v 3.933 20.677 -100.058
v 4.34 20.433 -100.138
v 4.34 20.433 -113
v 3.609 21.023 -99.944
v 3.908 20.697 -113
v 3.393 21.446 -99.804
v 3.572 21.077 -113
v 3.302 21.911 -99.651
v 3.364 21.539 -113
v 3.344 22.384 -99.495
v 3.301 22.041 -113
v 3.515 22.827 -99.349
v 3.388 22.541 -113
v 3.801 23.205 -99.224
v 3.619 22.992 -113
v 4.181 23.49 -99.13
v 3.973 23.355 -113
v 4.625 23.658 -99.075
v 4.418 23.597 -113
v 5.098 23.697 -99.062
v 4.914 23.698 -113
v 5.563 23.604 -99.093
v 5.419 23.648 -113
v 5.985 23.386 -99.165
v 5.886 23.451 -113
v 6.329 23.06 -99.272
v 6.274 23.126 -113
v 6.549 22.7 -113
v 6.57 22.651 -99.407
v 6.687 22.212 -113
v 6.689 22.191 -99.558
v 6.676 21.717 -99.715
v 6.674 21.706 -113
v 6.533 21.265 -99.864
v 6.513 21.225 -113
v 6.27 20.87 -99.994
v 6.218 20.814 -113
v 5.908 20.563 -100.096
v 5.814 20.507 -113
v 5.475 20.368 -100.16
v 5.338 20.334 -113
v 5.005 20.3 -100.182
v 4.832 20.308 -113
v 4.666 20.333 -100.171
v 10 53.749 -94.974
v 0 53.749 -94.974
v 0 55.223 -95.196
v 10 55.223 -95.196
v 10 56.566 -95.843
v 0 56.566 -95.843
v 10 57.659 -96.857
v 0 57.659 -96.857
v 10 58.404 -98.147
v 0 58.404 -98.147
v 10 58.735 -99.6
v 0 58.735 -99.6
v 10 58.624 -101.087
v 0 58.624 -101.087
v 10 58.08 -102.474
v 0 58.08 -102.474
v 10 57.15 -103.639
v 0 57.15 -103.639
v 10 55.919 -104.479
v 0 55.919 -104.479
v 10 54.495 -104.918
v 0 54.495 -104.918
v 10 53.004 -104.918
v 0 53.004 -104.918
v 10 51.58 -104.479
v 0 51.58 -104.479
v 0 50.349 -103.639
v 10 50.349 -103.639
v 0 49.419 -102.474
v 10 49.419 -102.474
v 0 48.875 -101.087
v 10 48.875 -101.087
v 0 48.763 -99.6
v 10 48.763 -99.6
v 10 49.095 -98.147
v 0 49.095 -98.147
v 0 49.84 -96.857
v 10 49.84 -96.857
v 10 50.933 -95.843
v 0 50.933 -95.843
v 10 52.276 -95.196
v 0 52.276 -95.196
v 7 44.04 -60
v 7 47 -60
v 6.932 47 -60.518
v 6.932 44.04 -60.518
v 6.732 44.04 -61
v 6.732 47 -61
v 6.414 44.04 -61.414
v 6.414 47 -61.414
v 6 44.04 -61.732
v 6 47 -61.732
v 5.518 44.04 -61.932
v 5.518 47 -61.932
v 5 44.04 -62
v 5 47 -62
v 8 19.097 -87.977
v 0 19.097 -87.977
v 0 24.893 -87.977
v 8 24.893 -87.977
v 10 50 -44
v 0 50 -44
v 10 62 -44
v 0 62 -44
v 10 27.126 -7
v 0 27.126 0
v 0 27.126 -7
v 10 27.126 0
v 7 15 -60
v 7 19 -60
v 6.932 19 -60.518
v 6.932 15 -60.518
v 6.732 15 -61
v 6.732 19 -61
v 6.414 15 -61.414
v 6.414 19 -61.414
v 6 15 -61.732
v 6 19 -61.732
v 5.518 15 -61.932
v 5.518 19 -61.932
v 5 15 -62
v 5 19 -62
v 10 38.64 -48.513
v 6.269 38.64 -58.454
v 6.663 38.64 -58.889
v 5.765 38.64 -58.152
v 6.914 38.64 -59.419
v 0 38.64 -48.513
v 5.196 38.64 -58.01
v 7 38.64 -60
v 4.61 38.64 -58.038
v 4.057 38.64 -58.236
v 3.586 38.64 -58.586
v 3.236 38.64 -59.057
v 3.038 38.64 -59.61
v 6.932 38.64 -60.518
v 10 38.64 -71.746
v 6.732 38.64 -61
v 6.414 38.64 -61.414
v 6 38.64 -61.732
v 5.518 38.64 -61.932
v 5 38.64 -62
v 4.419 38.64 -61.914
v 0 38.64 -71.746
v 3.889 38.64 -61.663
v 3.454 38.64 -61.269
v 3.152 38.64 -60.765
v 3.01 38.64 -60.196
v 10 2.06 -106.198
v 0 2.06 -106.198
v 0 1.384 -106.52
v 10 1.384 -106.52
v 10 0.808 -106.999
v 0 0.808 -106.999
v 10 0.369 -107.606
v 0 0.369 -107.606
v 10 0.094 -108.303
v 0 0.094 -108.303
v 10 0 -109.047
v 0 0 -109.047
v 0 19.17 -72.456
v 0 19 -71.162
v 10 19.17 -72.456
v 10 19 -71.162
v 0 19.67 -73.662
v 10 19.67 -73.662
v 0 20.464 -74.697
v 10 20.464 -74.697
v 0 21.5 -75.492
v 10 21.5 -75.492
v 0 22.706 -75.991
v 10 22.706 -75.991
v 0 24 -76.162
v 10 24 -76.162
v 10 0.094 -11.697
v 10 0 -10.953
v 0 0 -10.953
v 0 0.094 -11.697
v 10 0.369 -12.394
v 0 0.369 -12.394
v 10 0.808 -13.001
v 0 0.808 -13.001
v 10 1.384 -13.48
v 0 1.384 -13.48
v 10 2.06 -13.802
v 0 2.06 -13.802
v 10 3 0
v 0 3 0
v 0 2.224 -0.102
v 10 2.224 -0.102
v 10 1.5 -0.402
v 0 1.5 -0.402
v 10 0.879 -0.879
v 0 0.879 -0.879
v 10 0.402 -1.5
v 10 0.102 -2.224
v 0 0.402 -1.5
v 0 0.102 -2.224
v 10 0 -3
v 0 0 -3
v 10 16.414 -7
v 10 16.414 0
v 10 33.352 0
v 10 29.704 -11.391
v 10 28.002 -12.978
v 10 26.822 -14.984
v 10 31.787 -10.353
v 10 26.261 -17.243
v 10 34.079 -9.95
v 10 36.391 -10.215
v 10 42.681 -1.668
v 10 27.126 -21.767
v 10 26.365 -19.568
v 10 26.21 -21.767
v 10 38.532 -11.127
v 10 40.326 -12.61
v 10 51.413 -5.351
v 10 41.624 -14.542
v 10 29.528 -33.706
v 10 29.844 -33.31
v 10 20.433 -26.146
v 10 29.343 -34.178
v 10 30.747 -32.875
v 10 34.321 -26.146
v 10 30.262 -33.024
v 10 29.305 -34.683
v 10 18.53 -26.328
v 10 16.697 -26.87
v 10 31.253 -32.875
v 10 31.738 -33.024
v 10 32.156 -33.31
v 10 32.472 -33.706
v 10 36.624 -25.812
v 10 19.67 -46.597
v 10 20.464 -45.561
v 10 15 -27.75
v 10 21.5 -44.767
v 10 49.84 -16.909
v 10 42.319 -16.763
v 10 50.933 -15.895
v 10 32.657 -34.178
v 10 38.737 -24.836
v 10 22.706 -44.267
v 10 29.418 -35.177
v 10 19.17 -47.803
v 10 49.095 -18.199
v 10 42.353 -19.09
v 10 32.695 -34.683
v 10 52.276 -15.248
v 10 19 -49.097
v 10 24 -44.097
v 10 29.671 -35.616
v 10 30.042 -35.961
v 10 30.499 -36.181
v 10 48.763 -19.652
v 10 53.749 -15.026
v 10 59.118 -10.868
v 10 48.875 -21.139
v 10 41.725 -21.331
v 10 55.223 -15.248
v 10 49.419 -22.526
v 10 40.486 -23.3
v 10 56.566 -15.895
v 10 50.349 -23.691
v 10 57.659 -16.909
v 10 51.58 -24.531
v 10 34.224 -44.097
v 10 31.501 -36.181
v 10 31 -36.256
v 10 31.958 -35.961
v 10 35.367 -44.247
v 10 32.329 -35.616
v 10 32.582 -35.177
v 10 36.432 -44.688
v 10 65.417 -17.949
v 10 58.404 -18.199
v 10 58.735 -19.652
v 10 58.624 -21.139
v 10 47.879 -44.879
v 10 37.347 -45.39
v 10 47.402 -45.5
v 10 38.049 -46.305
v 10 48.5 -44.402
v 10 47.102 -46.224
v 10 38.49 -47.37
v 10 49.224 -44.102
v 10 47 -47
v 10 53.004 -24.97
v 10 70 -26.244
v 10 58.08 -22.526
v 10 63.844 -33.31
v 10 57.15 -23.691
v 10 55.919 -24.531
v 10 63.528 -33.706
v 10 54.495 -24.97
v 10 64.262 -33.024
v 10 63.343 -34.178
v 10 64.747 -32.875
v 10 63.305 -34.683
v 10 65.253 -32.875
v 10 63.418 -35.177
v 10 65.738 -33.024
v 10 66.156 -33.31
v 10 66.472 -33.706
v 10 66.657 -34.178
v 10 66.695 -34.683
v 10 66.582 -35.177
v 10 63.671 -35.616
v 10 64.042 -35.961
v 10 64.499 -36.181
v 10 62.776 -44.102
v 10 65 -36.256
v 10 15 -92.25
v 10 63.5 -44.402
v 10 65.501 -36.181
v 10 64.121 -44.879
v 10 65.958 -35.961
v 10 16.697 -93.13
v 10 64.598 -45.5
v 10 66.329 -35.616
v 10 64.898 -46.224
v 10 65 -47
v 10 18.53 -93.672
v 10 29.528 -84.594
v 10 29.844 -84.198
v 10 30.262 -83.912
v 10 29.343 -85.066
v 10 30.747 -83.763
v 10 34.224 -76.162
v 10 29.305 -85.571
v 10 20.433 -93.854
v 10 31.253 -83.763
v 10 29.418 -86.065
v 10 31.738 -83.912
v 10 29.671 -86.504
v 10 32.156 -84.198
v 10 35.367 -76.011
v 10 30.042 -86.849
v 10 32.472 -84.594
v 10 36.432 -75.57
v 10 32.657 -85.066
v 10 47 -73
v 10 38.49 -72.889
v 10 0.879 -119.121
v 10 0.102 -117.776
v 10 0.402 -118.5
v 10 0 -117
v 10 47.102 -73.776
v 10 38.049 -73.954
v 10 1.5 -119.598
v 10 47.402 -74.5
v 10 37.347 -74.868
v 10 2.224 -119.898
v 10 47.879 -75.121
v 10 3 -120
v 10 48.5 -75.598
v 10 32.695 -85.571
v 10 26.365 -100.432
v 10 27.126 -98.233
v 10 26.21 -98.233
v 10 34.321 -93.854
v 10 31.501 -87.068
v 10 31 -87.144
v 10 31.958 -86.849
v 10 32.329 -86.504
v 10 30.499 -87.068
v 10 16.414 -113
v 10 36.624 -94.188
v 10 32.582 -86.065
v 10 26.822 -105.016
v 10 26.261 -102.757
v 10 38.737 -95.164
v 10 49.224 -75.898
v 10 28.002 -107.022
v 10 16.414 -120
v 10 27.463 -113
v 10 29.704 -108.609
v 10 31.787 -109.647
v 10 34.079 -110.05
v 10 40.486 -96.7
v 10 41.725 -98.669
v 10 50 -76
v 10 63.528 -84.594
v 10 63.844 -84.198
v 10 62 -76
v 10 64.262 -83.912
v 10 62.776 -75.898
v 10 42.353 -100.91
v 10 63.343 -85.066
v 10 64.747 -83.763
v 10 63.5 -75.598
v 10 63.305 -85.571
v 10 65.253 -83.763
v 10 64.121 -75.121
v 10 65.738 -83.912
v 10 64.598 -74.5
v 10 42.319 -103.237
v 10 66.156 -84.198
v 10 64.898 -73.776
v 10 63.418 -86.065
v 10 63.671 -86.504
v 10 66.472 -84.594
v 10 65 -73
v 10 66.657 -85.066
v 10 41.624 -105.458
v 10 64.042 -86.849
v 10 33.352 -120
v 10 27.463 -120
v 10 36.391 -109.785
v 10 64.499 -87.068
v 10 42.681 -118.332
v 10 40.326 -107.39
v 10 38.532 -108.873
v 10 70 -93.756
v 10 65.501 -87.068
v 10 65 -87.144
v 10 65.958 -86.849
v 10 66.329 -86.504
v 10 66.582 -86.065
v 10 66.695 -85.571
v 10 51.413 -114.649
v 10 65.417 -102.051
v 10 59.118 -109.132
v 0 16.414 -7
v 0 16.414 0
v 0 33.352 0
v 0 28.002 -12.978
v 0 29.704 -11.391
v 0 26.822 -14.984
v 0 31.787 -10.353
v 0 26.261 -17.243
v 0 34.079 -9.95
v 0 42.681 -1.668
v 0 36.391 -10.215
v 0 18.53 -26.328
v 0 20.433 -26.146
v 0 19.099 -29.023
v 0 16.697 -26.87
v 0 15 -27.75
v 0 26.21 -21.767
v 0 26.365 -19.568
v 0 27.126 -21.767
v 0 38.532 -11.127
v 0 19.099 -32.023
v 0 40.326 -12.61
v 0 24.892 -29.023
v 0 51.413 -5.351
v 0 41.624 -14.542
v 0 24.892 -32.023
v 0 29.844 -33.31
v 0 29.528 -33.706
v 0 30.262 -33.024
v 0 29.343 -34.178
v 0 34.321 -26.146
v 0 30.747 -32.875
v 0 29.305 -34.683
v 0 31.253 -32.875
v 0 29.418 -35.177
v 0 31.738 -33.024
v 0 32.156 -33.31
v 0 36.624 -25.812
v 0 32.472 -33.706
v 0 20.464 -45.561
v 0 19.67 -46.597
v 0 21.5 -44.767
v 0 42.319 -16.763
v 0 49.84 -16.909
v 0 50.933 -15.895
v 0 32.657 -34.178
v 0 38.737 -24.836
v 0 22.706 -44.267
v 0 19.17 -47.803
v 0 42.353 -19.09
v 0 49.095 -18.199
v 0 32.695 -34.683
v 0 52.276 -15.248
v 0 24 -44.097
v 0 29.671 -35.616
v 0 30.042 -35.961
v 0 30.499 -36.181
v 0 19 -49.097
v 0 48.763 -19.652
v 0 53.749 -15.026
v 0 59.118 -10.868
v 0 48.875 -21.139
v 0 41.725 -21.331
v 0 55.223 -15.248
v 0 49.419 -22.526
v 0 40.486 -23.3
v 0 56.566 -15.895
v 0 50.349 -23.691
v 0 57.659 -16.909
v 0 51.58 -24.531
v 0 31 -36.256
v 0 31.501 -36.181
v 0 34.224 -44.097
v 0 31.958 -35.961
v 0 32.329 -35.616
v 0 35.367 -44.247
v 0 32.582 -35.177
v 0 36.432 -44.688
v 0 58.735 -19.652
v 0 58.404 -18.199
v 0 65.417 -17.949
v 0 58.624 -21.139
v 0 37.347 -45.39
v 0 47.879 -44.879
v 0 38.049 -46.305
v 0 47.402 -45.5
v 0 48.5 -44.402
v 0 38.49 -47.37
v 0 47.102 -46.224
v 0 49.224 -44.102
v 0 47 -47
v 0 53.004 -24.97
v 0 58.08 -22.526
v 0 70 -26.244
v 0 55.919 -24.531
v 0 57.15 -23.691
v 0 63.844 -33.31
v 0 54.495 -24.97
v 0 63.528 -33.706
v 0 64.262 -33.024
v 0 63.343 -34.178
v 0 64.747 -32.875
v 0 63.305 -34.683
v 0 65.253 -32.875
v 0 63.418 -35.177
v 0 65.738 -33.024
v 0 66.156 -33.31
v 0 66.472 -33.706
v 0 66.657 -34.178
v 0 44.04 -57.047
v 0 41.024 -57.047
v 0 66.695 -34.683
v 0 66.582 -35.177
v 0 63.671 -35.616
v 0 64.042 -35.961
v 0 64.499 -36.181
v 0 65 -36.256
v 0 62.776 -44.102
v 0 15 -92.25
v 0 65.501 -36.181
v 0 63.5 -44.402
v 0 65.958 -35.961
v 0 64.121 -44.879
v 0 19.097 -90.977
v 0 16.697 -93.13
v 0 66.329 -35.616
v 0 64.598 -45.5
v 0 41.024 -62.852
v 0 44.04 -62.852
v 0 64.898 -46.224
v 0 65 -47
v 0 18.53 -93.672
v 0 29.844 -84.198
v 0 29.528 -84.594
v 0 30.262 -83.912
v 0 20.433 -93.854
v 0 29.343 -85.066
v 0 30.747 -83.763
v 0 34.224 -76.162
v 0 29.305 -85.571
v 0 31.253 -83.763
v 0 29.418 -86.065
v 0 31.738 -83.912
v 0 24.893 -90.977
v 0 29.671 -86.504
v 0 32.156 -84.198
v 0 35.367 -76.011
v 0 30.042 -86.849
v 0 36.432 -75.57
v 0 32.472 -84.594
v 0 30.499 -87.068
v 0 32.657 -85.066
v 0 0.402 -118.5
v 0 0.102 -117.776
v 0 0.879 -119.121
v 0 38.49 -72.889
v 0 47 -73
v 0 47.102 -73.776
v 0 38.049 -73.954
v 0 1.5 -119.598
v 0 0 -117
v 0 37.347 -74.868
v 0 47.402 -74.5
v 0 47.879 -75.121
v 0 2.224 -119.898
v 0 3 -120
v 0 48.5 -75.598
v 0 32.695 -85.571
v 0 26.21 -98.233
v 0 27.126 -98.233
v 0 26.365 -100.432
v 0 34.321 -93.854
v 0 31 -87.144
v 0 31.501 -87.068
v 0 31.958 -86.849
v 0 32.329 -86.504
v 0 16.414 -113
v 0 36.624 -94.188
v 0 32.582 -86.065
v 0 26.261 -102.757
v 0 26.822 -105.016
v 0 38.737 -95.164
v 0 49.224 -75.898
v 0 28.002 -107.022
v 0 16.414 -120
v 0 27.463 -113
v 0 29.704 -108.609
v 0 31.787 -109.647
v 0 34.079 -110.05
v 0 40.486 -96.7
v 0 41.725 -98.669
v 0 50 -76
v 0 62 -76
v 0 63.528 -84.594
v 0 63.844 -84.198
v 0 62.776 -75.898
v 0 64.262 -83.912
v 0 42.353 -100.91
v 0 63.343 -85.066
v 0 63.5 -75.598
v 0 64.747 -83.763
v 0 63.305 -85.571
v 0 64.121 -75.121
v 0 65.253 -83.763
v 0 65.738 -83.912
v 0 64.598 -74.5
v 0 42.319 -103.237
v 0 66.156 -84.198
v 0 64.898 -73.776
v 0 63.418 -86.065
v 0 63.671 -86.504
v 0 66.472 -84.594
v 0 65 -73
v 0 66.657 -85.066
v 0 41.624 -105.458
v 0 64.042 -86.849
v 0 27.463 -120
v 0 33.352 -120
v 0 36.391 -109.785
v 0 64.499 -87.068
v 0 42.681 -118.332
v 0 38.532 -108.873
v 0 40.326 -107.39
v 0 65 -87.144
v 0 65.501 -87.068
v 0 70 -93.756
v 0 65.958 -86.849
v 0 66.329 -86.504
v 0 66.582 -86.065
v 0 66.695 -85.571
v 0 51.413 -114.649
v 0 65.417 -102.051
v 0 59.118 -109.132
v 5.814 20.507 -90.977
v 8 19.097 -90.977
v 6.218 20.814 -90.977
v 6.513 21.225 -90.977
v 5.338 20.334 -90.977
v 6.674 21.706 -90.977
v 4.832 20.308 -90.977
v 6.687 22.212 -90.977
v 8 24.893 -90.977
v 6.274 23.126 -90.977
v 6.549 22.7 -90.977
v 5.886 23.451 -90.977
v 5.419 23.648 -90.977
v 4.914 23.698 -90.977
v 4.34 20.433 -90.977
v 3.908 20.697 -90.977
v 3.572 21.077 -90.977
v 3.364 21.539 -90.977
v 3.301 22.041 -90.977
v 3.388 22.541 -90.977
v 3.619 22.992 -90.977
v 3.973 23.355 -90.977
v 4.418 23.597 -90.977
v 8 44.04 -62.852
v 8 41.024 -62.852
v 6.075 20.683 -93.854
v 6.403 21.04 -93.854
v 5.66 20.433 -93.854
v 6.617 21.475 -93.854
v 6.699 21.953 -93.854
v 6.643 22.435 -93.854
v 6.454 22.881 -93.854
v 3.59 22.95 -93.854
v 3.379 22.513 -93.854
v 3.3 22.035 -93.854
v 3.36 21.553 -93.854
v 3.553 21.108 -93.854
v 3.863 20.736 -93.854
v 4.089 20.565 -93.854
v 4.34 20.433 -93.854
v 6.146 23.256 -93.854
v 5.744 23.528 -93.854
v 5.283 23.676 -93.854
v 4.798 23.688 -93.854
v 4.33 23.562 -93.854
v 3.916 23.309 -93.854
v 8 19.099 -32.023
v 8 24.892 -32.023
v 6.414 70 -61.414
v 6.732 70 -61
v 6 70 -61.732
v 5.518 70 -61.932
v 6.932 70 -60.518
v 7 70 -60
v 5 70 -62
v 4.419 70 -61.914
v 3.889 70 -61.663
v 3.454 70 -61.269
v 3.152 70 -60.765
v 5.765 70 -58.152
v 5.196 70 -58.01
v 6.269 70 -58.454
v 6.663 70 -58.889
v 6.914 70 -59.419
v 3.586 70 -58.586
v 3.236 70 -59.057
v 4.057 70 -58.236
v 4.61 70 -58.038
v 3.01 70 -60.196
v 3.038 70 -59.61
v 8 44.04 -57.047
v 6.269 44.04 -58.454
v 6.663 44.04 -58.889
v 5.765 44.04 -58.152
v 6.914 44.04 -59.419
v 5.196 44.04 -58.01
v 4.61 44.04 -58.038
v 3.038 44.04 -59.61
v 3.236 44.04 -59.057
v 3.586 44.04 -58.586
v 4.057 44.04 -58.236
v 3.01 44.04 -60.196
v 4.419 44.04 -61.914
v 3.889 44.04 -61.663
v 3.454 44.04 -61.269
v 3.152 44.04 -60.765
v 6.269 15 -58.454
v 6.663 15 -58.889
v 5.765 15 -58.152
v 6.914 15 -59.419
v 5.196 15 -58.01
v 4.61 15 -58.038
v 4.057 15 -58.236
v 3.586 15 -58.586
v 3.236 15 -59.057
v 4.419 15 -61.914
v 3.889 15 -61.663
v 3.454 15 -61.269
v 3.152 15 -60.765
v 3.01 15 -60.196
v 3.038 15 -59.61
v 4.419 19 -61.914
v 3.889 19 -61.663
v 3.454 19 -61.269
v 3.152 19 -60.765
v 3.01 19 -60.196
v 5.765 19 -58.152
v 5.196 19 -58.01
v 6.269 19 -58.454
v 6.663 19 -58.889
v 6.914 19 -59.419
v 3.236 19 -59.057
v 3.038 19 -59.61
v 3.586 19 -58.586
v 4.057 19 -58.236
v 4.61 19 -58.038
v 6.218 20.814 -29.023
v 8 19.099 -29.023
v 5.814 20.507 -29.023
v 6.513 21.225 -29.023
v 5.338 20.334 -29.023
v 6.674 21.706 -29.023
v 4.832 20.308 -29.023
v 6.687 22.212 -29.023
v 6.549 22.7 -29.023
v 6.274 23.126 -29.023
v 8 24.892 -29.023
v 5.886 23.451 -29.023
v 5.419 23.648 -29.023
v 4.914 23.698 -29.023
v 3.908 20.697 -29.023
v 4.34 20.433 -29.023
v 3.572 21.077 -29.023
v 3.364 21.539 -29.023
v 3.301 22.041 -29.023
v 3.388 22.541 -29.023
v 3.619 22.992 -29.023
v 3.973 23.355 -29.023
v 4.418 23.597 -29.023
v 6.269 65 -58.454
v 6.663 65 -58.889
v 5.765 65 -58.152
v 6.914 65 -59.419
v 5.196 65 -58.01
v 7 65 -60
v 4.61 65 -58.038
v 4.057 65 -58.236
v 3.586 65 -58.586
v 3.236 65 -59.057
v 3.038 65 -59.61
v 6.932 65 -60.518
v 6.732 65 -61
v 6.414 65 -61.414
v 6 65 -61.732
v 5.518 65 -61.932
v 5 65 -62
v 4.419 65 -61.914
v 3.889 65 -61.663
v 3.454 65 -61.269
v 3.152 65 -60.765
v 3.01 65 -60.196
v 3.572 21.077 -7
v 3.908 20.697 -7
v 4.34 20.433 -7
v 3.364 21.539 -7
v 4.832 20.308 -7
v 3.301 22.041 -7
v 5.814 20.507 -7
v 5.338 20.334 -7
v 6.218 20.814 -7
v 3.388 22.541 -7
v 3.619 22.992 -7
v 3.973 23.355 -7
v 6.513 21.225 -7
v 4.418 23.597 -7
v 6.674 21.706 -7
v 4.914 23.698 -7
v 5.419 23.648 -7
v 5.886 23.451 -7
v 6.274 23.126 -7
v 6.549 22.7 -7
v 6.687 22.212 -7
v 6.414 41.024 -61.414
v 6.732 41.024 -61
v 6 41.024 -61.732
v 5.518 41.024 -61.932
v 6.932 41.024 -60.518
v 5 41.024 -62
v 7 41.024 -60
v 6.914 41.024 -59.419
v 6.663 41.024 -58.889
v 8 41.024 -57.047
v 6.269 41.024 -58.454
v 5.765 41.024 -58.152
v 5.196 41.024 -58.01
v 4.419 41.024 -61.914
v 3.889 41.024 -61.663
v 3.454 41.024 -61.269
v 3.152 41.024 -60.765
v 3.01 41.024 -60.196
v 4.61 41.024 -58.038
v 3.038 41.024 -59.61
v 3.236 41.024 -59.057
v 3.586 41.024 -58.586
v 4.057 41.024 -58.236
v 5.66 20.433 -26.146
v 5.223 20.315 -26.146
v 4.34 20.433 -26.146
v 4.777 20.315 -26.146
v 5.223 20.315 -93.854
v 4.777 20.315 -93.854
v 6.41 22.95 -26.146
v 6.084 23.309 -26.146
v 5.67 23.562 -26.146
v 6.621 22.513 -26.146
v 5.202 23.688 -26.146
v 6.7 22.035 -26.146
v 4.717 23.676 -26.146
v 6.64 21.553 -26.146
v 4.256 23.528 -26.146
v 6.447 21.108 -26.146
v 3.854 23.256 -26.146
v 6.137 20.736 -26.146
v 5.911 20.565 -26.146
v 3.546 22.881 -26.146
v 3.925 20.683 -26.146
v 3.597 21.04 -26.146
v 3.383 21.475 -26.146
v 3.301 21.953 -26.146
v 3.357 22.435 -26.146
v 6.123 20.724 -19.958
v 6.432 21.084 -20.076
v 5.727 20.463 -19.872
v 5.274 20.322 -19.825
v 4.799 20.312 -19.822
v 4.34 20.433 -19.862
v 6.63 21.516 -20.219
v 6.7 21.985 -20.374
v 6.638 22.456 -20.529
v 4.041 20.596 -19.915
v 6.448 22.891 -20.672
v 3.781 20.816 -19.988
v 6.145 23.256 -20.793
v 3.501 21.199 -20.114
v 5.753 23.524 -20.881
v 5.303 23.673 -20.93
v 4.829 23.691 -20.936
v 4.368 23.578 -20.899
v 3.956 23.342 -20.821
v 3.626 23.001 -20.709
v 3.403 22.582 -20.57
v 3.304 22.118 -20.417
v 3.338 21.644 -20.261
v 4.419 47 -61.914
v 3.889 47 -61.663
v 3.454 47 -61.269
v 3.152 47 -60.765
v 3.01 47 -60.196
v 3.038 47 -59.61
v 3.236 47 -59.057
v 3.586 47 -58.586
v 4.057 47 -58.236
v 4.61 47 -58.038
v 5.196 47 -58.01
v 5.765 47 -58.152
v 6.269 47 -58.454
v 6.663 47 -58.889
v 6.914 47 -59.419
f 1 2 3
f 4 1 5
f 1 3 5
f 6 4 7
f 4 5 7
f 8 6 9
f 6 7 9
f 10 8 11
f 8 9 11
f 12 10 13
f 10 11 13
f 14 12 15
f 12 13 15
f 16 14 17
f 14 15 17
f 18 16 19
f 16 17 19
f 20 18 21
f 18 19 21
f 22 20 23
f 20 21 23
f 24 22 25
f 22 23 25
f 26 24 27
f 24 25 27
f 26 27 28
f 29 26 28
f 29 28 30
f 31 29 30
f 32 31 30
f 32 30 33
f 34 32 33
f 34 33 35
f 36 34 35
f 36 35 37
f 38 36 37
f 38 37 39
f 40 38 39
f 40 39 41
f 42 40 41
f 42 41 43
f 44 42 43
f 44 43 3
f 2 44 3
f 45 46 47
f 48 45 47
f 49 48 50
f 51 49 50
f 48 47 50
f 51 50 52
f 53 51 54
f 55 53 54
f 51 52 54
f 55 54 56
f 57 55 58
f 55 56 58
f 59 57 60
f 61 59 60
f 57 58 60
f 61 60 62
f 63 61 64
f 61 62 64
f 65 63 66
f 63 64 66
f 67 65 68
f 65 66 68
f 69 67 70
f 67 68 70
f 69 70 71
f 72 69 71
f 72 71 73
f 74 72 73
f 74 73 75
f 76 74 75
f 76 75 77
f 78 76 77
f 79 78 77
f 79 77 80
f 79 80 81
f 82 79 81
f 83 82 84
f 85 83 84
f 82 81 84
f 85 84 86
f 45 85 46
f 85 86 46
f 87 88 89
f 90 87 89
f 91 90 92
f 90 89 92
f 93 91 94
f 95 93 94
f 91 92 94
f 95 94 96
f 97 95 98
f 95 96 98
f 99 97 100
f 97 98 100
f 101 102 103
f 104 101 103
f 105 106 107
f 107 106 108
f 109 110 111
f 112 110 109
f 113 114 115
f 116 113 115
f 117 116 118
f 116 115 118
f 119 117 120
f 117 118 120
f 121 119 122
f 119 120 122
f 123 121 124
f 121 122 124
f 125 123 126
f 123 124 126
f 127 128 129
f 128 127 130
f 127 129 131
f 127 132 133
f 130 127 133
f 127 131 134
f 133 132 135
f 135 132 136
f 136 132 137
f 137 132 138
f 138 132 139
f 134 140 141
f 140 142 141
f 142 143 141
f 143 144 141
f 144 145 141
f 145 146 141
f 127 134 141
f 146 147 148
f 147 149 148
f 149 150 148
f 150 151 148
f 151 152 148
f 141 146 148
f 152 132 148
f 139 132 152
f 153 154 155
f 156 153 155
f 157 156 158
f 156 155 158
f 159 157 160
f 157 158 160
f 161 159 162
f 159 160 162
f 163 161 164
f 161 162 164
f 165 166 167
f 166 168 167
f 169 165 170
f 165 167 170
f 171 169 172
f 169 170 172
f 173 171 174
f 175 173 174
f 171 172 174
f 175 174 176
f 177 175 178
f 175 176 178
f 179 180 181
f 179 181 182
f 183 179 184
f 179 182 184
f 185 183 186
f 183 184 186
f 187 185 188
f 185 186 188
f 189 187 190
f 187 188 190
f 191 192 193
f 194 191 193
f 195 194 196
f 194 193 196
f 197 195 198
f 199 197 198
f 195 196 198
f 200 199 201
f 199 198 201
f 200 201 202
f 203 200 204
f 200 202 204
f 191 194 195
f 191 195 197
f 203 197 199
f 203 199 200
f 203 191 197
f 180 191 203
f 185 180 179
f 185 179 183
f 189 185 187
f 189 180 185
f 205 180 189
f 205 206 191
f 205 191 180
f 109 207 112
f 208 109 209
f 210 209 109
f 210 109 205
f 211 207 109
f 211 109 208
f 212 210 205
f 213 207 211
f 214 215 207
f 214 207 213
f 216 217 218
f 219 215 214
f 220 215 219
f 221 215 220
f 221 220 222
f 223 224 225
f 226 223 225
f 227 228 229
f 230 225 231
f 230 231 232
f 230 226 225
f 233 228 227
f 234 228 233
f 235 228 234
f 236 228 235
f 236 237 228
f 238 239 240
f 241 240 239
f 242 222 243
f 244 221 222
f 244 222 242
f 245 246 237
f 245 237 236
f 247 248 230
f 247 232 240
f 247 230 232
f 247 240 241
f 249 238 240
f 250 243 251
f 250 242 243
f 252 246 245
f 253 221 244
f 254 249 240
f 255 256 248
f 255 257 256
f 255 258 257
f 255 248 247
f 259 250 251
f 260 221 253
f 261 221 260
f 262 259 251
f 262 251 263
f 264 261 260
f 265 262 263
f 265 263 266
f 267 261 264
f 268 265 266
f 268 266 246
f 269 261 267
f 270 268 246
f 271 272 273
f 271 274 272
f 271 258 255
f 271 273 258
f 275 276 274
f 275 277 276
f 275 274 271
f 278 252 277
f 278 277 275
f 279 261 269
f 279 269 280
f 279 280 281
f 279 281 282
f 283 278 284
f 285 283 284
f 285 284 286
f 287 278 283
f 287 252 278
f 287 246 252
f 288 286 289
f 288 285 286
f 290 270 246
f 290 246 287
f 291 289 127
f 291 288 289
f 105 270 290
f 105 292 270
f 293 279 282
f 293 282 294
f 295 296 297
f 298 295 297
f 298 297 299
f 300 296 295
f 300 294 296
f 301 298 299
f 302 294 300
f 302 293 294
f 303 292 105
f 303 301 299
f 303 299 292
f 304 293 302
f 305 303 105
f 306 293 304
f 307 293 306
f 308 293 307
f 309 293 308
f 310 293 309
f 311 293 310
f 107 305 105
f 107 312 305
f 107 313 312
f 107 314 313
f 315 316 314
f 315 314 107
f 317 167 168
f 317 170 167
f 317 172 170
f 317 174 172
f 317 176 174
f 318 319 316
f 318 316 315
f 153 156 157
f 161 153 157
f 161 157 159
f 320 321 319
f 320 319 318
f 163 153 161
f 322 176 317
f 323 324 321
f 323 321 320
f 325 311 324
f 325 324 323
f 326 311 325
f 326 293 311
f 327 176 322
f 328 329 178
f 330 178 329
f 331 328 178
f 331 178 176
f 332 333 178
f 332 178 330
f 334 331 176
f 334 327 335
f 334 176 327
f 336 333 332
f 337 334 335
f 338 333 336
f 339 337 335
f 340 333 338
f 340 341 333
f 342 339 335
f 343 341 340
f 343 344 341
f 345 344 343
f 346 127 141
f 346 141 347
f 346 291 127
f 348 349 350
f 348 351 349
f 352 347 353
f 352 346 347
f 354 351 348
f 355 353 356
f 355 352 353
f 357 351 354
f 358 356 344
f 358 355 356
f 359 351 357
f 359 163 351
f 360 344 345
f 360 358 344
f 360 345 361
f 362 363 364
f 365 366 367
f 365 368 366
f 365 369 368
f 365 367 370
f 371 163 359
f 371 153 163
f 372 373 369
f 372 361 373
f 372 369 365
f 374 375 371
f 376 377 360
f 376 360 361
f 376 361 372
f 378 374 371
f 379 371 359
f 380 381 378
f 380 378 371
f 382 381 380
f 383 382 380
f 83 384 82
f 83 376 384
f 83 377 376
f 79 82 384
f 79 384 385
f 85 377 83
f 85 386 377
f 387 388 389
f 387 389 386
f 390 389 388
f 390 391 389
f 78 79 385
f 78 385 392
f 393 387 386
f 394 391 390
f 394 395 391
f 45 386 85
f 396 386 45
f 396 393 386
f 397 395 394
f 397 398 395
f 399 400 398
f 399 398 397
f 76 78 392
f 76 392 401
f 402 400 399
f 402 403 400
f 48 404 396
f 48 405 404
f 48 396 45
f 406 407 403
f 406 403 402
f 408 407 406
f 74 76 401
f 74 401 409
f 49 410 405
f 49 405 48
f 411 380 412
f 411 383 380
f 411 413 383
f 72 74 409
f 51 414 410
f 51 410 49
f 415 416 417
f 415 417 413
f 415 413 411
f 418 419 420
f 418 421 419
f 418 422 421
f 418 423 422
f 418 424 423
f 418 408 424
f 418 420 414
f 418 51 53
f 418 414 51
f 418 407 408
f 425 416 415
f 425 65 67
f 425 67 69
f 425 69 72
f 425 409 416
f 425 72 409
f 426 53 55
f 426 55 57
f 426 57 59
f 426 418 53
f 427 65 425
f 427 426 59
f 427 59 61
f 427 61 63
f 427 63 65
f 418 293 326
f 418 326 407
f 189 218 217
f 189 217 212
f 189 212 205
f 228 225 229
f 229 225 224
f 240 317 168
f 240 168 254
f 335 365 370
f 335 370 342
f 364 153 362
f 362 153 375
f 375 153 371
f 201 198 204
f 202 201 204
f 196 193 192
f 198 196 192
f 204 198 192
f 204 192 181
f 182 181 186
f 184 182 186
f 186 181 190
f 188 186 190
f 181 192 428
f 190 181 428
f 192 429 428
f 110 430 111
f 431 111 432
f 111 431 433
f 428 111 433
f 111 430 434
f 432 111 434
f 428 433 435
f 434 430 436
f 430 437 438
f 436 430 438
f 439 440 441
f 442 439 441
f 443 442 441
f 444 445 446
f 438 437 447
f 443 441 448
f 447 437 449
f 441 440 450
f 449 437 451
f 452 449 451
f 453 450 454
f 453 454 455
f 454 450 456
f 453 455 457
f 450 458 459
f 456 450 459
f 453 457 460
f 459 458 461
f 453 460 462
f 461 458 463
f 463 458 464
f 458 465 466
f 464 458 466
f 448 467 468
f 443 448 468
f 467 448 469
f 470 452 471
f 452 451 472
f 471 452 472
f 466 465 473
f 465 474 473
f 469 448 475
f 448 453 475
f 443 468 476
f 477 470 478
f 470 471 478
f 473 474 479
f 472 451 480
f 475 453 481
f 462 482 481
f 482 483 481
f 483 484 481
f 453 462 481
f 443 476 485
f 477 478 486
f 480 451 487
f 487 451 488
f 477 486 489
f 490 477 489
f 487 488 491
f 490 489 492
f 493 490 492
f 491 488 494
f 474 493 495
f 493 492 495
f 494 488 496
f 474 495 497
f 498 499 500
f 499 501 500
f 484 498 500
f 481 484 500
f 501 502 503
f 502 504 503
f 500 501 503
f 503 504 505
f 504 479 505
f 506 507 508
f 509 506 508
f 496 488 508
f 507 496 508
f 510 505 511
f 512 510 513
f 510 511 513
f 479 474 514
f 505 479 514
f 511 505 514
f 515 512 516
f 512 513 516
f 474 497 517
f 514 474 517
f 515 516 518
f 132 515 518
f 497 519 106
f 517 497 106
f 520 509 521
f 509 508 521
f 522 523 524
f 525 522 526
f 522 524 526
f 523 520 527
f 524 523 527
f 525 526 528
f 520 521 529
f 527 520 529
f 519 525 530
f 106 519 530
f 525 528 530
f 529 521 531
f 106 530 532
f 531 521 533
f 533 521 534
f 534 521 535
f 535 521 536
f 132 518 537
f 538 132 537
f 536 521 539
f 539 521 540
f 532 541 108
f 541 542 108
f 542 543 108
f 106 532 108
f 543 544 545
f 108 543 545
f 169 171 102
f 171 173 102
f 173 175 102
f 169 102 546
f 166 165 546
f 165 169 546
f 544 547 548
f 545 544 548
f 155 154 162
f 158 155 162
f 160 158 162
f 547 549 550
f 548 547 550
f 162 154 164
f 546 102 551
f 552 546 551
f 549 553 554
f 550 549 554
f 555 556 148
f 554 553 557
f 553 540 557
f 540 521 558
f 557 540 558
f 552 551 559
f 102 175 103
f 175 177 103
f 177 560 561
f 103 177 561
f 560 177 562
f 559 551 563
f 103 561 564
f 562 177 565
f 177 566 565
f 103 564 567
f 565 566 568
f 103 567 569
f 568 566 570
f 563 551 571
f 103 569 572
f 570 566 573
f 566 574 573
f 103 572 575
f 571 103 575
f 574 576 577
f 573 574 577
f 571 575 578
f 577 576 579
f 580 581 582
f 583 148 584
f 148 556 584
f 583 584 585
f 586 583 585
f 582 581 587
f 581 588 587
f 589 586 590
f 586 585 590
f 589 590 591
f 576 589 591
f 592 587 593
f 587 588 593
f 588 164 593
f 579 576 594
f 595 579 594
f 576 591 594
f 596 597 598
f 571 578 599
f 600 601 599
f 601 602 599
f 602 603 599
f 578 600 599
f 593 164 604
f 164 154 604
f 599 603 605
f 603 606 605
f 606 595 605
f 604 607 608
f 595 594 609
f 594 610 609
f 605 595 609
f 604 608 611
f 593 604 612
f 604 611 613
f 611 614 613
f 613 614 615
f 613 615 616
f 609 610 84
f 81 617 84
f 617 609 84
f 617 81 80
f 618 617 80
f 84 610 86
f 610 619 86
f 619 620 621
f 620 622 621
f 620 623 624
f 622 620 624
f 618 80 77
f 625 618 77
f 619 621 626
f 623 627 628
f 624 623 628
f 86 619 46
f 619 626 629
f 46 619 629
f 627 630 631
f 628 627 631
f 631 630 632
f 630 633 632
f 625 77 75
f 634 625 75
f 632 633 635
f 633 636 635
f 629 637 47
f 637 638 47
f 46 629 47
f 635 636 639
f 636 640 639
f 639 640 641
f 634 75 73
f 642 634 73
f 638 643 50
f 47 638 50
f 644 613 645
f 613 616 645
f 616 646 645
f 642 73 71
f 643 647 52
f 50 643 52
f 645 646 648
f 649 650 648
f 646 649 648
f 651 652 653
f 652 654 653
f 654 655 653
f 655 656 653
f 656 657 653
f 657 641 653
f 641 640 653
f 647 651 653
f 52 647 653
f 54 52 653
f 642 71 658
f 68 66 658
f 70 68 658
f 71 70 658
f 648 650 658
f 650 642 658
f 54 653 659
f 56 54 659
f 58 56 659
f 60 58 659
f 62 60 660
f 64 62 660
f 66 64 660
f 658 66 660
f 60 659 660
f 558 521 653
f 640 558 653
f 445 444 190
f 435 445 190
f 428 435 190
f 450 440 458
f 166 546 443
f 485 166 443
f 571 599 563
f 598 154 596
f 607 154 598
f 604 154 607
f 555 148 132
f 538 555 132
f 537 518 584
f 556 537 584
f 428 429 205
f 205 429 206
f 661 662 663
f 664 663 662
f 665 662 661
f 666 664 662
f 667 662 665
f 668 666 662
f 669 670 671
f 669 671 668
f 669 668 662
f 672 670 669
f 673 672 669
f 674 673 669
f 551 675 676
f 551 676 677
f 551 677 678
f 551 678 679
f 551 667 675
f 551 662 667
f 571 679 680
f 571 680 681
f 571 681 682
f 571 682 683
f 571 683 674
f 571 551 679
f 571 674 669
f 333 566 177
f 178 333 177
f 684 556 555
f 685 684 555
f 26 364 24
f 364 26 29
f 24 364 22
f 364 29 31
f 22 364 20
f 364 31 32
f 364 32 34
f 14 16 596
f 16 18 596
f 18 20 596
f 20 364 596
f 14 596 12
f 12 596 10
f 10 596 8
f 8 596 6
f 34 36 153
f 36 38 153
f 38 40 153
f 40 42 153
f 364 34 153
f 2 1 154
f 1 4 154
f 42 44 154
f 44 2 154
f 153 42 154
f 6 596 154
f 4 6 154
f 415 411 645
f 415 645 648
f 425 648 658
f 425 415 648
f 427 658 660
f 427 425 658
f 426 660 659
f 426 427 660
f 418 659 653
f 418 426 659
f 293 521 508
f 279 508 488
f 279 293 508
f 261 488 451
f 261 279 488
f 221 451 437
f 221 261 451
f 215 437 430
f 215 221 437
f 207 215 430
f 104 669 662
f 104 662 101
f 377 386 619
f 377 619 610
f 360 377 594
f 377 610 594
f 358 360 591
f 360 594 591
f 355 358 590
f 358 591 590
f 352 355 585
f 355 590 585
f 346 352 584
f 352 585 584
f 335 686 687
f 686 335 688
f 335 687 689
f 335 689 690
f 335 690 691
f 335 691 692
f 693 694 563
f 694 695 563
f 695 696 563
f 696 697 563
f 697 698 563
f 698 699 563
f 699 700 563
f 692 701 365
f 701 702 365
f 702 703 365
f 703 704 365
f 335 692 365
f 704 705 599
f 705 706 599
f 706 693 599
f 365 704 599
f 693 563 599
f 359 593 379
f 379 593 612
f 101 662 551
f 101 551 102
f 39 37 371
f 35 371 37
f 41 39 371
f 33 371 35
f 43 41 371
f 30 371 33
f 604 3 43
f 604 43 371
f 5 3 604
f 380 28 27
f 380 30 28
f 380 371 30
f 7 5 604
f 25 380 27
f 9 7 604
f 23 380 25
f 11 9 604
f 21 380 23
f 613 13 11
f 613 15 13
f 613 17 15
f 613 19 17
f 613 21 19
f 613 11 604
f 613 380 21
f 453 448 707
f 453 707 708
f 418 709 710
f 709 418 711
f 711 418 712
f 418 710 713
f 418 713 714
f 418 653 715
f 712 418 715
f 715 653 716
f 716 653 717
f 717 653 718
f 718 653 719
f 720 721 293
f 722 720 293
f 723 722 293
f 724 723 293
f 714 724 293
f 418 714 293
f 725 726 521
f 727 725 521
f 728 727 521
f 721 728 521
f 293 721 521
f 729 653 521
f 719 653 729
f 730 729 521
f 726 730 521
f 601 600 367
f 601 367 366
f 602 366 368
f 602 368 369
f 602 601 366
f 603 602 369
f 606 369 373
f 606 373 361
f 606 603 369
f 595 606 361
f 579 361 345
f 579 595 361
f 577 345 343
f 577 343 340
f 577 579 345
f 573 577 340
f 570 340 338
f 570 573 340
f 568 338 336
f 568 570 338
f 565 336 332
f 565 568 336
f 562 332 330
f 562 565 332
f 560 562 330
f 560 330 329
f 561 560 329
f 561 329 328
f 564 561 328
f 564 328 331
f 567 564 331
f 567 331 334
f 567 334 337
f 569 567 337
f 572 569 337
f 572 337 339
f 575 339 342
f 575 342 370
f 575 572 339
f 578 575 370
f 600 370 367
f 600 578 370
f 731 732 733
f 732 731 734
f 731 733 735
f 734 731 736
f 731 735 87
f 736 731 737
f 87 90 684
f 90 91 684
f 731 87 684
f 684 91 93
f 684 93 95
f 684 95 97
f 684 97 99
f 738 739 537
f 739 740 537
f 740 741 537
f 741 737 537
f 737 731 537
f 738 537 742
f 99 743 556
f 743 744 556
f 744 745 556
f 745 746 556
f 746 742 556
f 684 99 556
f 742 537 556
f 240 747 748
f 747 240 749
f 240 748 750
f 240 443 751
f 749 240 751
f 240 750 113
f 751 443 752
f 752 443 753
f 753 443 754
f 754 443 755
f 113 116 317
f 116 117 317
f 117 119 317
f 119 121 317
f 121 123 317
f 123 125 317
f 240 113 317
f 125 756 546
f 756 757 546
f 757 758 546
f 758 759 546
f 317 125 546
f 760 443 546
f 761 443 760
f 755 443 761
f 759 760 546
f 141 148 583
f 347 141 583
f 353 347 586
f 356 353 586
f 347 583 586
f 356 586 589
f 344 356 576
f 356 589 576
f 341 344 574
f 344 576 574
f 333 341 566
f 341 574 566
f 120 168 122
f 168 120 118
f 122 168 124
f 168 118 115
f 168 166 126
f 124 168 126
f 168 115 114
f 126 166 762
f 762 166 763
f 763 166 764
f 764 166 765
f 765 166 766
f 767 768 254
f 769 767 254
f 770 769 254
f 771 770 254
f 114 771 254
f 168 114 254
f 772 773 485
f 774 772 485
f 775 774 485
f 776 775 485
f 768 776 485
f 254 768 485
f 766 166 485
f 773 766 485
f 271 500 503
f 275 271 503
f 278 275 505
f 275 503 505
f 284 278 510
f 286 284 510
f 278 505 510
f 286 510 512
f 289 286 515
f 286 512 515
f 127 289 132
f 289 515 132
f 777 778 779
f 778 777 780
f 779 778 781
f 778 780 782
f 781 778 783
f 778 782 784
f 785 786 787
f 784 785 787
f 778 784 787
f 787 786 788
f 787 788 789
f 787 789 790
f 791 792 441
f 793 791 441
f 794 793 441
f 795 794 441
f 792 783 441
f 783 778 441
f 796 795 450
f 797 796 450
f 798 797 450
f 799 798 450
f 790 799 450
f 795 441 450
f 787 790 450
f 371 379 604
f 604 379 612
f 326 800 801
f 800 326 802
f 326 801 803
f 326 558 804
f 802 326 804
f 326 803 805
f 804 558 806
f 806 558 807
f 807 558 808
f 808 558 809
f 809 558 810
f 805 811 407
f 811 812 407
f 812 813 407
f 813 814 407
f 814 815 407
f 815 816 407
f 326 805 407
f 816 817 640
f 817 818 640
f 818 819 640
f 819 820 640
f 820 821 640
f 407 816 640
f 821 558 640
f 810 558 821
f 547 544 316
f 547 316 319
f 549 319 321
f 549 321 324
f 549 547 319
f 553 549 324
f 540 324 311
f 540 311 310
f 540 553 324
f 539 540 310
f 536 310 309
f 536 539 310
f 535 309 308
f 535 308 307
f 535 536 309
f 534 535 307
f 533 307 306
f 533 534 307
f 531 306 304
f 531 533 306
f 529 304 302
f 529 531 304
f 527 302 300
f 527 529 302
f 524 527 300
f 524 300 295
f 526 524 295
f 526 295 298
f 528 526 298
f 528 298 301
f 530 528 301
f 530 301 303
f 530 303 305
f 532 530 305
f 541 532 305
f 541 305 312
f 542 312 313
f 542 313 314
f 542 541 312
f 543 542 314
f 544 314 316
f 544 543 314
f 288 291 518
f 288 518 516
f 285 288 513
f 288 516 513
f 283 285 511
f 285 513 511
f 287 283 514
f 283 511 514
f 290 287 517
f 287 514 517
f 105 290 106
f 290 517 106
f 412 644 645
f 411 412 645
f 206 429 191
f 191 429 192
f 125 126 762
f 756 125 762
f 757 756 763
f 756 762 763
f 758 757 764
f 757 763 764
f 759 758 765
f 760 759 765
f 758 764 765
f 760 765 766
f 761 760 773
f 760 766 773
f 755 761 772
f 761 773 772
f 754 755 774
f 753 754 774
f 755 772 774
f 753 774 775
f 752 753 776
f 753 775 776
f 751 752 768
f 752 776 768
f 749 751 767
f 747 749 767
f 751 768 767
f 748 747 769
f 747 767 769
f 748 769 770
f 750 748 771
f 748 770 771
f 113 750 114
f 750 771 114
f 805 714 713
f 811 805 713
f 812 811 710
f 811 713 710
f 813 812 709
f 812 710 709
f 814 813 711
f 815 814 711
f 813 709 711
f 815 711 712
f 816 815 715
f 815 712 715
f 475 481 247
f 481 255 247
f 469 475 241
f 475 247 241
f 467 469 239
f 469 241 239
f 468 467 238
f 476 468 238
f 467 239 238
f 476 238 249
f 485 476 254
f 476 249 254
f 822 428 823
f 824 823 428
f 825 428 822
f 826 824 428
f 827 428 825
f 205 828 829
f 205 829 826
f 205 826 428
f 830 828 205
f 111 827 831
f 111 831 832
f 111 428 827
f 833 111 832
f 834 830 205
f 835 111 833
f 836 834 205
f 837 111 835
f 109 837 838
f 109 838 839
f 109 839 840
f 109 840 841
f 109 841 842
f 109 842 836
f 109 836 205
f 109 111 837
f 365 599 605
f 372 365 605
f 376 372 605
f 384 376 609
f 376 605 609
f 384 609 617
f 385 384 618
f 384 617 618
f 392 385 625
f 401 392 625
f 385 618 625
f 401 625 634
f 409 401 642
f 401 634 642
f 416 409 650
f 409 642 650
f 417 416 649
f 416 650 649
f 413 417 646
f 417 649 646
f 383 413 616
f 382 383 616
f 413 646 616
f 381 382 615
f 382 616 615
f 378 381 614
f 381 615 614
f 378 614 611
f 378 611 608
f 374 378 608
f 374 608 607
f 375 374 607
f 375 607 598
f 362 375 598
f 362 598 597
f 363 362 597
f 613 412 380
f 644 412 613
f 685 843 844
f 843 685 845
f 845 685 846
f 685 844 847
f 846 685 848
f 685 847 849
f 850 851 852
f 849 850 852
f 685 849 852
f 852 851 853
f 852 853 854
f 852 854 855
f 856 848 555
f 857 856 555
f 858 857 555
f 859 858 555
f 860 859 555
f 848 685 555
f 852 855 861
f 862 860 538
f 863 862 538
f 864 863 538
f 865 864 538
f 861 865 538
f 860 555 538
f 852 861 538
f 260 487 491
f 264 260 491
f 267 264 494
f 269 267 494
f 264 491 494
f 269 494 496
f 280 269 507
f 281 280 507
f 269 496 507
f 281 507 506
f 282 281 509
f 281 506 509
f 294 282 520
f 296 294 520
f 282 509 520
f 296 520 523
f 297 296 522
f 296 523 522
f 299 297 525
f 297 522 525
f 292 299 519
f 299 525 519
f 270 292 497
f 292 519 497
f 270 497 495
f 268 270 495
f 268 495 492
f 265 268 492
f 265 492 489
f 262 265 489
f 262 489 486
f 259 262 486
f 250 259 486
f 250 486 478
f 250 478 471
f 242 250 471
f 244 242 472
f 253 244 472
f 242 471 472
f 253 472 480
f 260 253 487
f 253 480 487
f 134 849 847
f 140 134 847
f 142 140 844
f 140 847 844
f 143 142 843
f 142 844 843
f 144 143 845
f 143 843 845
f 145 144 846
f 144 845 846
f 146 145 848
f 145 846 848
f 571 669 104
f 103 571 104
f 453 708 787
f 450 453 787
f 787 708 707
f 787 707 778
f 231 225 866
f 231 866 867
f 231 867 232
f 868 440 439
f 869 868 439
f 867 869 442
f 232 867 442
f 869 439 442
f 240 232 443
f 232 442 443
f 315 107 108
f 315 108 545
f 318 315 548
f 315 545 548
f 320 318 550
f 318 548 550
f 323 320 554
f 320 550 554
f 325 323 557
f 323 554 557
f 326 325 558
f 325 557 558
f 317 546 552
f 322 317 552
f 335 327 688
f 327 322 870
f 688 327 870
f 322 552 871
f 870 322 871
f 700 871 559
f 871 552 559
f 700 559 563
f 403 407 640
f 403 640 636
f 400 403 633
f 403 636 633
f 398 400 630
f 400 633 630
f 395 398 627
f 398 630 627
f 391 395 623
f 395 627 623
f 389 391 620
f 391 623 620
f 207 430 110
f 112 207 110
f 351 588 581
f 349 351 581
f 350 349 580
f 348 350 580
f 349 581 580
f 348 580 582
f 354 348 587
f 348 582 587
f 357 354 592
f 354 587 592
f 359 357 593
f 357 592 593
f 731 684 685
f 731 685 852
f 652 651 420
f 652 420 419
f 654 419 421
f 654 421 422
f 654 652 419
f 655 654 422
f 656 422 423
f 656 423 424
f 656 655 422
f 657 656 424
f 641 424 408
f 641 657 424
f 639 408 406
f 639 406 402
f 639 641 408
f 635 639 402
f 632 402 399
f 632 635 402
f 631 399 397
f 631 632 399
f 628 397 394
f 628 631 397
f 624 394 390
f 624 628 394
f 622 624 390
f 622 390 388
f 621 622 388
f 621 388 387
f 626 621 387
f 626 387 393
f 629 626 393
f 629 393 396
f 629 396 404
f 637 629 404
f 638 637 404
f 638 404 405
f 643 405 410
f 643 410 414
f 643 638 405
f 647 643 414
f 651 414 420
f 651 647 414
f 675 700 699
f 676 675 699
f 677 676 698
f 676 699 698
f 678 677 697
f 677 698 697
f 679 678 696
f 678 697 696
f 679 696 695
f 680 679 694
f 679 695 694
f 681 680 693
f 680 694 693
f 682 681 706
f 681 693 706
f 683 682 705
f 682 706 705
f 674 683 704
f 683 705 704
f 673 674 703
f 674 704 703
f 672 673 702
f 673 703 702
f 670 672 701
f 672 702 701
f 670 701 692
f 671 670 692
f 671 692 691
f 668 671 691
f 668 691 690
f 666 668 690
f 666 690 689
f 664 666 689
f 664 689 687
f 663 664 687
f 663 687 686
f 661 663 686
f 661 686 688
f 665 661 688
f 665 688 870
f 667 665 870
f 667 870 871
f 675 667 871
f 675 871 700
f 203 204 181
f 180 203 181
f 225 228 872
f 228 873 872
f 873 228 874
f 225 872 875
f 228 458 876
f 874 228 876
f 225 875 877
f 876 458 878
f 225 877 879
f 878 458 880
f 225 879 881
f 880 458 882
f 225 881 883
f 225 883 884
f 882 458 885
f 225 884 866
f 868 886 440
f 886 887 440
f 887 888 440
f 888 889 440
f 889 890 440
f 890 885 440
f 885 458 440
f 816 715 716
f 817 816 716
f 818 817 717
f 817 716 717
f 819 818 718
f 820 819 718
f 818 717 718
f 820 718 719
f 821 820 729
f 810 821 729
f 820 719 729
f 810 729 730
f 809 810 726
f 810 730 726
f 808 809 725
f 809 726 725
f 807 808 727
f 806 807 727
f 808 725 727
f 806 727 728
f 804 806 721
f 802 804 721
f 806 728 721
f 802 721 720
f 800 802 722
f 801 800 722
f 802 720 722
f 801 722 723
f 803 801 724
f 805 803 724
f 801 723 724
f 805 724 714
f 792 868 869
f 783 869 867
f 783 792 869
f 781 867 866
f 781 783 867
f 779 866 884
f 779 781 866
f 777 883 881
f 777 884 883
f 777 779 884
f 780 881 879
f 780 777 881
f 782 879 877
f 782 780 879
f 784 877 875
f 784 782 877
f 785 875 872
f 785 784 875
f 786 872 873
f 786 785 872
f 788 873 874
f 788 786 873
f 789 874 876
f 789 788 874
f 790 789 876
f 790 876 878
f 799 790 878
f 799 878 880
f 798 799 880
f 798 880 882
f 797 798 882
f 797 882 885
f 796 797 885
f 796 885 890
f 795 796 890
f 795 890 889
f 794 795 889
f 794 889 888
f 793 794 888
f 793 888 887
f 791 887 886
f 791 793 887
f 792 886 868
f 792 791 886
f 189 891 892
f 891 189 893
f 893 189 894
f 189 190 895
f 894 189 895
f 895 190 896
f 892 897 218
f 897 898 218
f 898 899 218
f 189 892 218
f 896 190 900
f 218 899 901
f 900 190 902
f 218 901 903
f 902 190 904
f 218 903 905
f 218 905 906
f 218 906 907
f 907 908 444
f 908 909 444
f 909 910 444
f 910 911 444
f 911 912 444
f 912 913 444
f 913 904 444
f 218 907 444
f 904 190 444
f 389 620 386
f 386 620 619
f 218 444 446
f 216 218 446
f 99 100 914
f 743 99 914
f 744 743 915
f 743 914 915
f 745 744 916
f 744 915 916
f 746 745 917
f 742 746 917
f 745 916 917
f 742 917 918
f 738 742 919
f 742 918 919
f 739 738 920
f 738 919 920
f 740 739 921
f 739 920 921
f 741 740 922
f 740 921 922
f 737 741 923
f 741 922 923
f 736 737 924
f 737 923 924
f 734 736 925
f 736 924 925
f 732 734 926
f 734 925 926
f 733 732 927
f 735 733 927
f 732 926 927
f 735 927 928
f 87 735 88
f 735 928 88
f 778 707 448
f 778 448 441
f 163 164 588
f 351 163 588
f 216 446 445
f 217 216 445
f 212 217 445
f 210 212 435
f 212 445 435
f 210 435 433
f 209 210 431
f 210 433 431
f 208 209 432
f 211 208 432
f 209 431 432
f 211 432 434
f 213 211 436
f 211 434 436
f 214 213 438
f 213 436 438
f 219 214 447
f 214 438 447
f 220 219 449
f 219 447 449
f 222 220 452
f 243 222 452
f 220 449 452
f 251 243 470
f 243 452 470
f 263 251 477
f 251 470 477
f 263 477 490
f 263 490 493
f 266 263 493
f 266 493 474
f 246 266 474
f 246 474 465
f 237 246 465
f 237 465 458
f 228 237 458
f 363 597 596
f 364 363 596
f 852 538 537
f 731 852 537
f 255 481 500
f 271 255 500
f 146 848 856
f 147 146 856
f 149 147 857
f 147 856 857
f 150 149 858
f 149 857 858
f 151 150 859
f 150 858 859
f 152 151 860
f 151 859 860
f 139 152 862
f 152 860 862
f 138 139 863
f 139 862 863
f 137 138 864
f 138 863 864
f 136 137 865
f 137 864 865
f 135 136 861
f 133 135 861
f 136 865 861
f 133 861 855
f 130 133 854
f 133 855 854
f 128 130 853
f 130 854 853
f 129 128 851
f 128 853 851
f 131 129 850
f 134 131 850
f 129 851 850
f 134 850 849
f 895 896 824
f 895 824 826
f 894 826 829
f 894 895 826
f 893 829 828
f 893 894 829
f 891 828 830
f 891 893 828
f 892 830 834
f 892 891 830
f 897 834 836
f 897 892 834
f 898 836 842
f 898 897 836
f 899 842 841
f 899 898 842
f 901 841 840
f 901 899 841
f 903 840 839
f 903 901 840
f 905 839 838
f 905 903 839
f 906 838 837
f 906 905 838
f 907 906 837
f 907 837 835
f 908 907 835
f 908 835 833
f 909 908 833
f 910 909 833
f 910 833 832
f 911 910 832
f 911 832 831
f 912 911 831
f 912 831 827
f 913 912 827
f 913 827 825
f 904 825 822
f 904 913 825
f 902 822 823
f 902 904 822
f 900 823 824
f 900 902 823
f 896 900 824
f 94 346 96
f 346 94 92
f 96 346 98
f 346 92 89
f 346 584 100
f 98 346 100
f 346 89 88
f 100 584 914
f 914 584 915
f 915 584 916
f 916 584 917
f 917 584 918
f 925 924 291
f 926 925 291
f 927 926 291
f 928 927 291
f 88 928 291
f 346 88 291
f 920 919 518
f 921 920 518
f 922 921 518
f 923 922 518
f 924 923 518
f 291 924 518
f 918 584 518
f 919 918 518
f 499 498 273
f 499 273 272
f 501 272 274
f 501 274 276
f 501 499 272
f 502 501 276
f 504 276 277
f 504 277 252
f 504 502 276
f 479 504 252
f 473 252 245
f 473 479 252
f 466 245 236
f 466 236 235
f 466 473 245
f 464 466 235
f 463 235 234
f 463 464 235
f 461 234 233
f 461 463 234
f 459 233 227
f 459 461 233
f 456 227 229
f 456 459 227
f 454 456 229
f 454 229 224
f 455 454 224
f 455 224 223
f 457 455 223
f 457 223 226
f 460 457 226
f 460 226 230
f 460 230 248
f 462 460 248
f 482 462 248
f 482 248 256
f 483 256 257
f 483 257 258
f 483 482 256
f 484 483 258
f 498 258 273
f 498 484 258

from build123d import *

# Parameters (mm, degrees)
SKETCH_1_R                = 1.7
EXTRUDE_1_DEPTH           = 10
CUT_EXTRUDE_1_DEPTH       = 67
SKETCH_3_W                = 3
SKETCH_3_H                = 5.795399196
SKETCH_3_H_2              = 5.79316294
CUT_EXTRUDE_2_DEPTH       = 8
SKETCH_5_R                = 1.7
CUT_EXTRUDE_3_DEPTH       = 31
CUT_EXTRUDE_START         = -31
SKETCH_6_R                = 1.7
CUT_EXTRUDE_4_DEPTH       = 31
SKETCH_9_R                = 5
CUT_EXTRUDE_6_DEPTH       = 10
CUT_EXTRUDE_7_DEPTH       = 10
CUT_EXTRUDE_9_DEPTH       = 10
FILLET_1_R                = 5
CUT_EXTRUDE_10_DEPTH      = 140.283882779
CUT_EXTRUDE_10_DEPTH_BACK = 10
SKETCH_12_W               = 10
SKETCH_12_H               = 11.048825586
CUT_EXTRUDE_11_DEPTH      = 7
SKETCH_14_W               = 10
SKETCH_14_H               = 10.712519762
CUT_EXTRUDE_12_DEPTH      = 7


with BuildPart() as part:
    # Эскиз1 → Бобышка-Вытянуть1 (new body)
    with BuildSketch(Plane(origin=(0, 0, 0), x_dir=(0, 0, -1), z_dir=(1, 0, 0))):
        with BuildLine():
            Line((3, 0), (10.95312335, 0))
            ThreePointArc((10.95312335, 0), (12.711116168, 0.569061652), (13.802171454, 2.060359164))
            Line((13.802171454, 2.060359164), (21.766885307, 26.20985548))
            Line((21.766885307, 26.20985548), (21.766885307, 27.126272908))
            ThreePointArc((21.766885307, 27.126272908), (11.12679914, 38.53238769), (26.145937625, 34.320931027))
            Line((26.145937625, 34.320931027), (26.145765698, 20.433139819))
            ThreePointArc((26.145765698, 20.433139819), (29.074654117, 13.361991979), (36.145765697, 10.433016021))
            Line((36.145765697, 10.433016021), (83.854234303, 10.433016021))
            ThreePointArc((83.854234303, 10.433016021), (90.925345883, 13.361991979), (93.854234302, 20.433139819))
            Line((93.854234302, 20.433139819), (93.854062375, 34.320931027))
            ThreePointArc((93.854062375, 34.320931027), (108.87320086, 38.53238769), (98.233114693, 27.126272908))
            Line((98.233114693, 27.126272908), (98.233114693, 26.20985548))
            Line((98.233114693, 26.20985548), (106.197828546, 2.060359164))
            ThreePointArc((106.197828546, 2.060359164), (107.288883832, 0.569061652), (109.04687665, 0))
            Line((109.04687665, 0), (117, 0))
            ThreePointArc((117, 0), (119.121320344, 0.878679656), (120, 3))
            Line((120, 3), (120, 67))
            ThreePointArc((120, 67), (119.121320344, 69.121320344), (117, 70))
            Line((117, 70), (3, 70))
            ThreePointArc((3, 70), (0.878679656, 69.121320344), (0, 67))
            Line((0, 67), (0, 3))
            ThreePointArc((0, 3), (0.878679656, 0.878679656), (3, 0))
        make_face()
        with Locations((34.556037496, 65)):
            Circle(SKETCH_1_R, mode=Mode.SUBTRACT)
        with Locations((34.556037496, 31)):
            Circle(SKETCH_1_R, mode=Mode.SUBTRACT)
        with Locations((85.443962504, 31)):
            Circle(SKETCH_1_R, mode=Mode.SUBTRACT)
        with Locations((85.443962504, 65)):
            Circle(SKETCH_1_R, mode=Mode.SUBTRACT)
        with BuildLine():
            Line((47, 65), (73, 65))
            ThreePointArc((73, 65), (75.121320344, 64.121320344), (76, 62))
            Line((76, 62), (76, 50))
            ThreePointArc((76, 50), (75.121320344, 47.878679656), (73, 47))
            Line((73, 47), (47, 47))
            ThreePointArc((47, 47), (44.878679656, 47.878679656), (44, 50))
            Line((44, 50), (44, 62))
            ThreePointArc((44, 62), (44.878679656, 64.121320344), (47, 65))
        make_face(mode=Mode.SUBTRACT)
        with BuildLine():
            Line((48.512942473, 38.640223749), (71.745561711, 38.640223749))
            ThreePointArc((71.745561711, 38.640223749), (76.161679417, 34.224106042), (71.745561711, 29.807988336))
            Line((71.745561711, 29.807988336), (48.512942473, 29.807988336))
            ThreePointArc((48.512942473, 29.807988336), (44.096824767, 34.224106042), (48.512942473, 38.640223749))
        make_face(mode=Mode.SUBTRACT)
    extrude(amount=EXTRUDE_1_DEPTH)

    # Эскиз2 → Вырез-Вытянуть1 (cut)
    with BuildSketch(Plane(origin=(0, 70, 0), x_dir=(1, 0, 0), z_dir=(0, 1, 0))):
        with BuildLine():
            ThreePointArc((7, 60), (6.414213562, 61.414213562), (5, 62))
            Line((5, 62), (5, 60))
            Line((5, 60), (7, 60))
        make_face()
        with BuildLine():
            Line((5, 60), (5, 62))
            ThreePointArc((5, 62), (3.585786438, 58.585786438), (7, 60))
            Line((7, 60), (5, 60))
        make_face()
    extrude(amount=-CUT_EXTRUDE_1_DEPTH, mode=Mode.SUBTRACT)

    # Эскиз3 → Вырез-Вытянуть2 (cut)
    with BuildSketch(Plane.ZY):
        with Locations((-89.477143784, 21.994873796)):
            Rectangle(SKETCH_3_W, SKETCH_3_H)
        Polygon((-62.852047751, 44.039665997), (-62.852047751, 41.024446306), (-57.047413287, 41.024446306), (-57.047413287, 44.039665997), (-59.949730519, 44.039665997), align=None)
        with Locations((-30.522856216, 21.995572621)):
            Rectangle(SKETCH_3_W, SKETCH_3_H_2)
    extrude(amount=-CUT_EXTRUDE_2_DEPTH, mode=Mode.SUBTRACT)

    # Эскиз5 → Вырез-Вытянуть3 (cut)
    with BuildSketch(Plane(origin=(0, 0, -120), x_dir=(-1, 0, 0), z_dir=(0, 0, -1))):
        with Locations(Location((-5, 22, 0), (0, 0, 292.826701249))):
            Circle(SKETCH_5_R)
    extrude(amount=-CUT_EXTRUDE_3_DEPTH, mode=Mode.SUBTRACT)

    # Эскиз6 → Вырез-Вытянуть4 (cut)
    with BuildSketch(Plane.XY.offset(CUT_EXTRUDE_START)):
        with Locations(Location((5, 22, 0), (0, 0, 247.173298751))):
            Circle(SKETCH_6_R)
    extrude(amount=CUT_EXTRUDE_4_DEPTH, mode=Mode.SUBTRACT)

    # Эскиз9 → Вырез-Вытянуть6 (cut)
    with BuildSketch(Plane.ZY):
        with Locations((-99.973969782, 53.749400687)):
            Circle(SKETCH_9_R)
        with Locations((-20.026030218, 53.749400687)):
            Circle(SKETCH_9_R)
    extrude(amount=-CUT_EXTRUDE_6_DEPTH, mode=Mode.SUBTRACT)

    # Эскиз7 → Вырез-Вытянуть7 (cut)
    with BuildSketch(Plane.ZY):
        with BuildLine():
            ThreePointArc((-71.745561711, 29.807988336), (-74.868228487, 31.101439266), (-76.161679417, 34.224106042))
            Line((-76.161679417, 34.224106042), (-76.161679417, 19))
            Line((-76.161679417, 19), (-44.096824767, 19))
            Line((-44.096824767, 19), (-44.096824767, 34.224106042))
            ThreePointArc((-44.096824767, 34.224106042), (-45.390275697, 31.101439266), (-48.512942473, 29.807988336))
            Line((-48.512942473, 29.807988336), (-71.745561711, 29.807988336))
        make_face()
    extrude(amount=-CUT_EXTRUDE_7_DEPTH, mode=Mode.SUBTRACT)

    # Эскиз10 → Вырез-Вытянуть9 (cut)
    with BuildSketch(Plane.ZY):
        Polygon((-26.82075904, 15), (-60.129252092, 15), (-92.249610227, 15), (-93.165688325, 15), (-93.165688325, 8.625567354), (-26.82075904, 8.625567354), align=None)
    extrude(amount=-CUT_EXTRUDE_9_DEPTH, mode=Mode.SUBTRACT)

    # Скругление1
    fillet_1_edges = [part.edges().sort_by_distance(p)[0] for p in [
        (5, 19, -44.096824767),
        (5, 19, -76.161679417),
    ]]
    fillet(fillet_1_edges, radius=FILLET_1_R)

    # Эскиз11 → Вырез-Вытянуть10 (cut, two sides: drawn at the far end of the back side and taken through both)
    with BuildSketch(Plane.ZY.offset(-CUT_EXTRUDE_10_DEPTH_BACK)):
        with BuildLine():
            ThreePointArc((-120.033991766, 32.77619879), (-112.271772588, 55.183752349), (-93.756122218, 70))
            Line((-93.756122218, 70), (-105.662508764, 70))
            Line((-105.662508764, 70), (-120.092282854, 70))
            Line((-120.092282854, 70), (-120.033991766, 32.77619879))
        make_face()
        with BuildLine():
            Line((0.033991766, 32.77619879), (0.092282854, 70))
            Line((0.092282854, 70), (-14.337491236, 70))
            Line((-14.337491236, 70), (-26.243877782, 70))
            ThreePointArc((-26.243877782, 70), (-7.728227412, 55.183752349), (0.033991766, 32.77619879))
        make_face()
    extrude(amount=CUT_EXTRUDE_10_DEPTH + CUT_EXTRUDE_10_DEPTH_BACK, mode=Mode.SUBTRACT)

    # Эскиз12 → Вырез-Вытянуть11 (cut)
    with BuildSketch(Plane(origin=(0, 0, -120), x_dir=(-1, 0, 0), z_dir=(0, 0, -1))):
        with Locations((-5, 21.938165939)):
            Rectangle(SKETCH_12_W, SKETCH_12_H)
    extrude(amount=-CUT_EXTRUDE_11_DEPTH, mode=Mode.SUBTRACT)

    # Эскиз14 → Вырез-Вытянуть12 (cut)
    with BuildSketch(Plane.XY):
        with Locations((5, 21.770013027)):
            Rectangle(SKETCH_14_W, SKETCH_14_H)
    extrude(amount=-CUT_EXTRUDE_12_DEPTH, mode=Mode.SUBTRACT)


solid = part.part
